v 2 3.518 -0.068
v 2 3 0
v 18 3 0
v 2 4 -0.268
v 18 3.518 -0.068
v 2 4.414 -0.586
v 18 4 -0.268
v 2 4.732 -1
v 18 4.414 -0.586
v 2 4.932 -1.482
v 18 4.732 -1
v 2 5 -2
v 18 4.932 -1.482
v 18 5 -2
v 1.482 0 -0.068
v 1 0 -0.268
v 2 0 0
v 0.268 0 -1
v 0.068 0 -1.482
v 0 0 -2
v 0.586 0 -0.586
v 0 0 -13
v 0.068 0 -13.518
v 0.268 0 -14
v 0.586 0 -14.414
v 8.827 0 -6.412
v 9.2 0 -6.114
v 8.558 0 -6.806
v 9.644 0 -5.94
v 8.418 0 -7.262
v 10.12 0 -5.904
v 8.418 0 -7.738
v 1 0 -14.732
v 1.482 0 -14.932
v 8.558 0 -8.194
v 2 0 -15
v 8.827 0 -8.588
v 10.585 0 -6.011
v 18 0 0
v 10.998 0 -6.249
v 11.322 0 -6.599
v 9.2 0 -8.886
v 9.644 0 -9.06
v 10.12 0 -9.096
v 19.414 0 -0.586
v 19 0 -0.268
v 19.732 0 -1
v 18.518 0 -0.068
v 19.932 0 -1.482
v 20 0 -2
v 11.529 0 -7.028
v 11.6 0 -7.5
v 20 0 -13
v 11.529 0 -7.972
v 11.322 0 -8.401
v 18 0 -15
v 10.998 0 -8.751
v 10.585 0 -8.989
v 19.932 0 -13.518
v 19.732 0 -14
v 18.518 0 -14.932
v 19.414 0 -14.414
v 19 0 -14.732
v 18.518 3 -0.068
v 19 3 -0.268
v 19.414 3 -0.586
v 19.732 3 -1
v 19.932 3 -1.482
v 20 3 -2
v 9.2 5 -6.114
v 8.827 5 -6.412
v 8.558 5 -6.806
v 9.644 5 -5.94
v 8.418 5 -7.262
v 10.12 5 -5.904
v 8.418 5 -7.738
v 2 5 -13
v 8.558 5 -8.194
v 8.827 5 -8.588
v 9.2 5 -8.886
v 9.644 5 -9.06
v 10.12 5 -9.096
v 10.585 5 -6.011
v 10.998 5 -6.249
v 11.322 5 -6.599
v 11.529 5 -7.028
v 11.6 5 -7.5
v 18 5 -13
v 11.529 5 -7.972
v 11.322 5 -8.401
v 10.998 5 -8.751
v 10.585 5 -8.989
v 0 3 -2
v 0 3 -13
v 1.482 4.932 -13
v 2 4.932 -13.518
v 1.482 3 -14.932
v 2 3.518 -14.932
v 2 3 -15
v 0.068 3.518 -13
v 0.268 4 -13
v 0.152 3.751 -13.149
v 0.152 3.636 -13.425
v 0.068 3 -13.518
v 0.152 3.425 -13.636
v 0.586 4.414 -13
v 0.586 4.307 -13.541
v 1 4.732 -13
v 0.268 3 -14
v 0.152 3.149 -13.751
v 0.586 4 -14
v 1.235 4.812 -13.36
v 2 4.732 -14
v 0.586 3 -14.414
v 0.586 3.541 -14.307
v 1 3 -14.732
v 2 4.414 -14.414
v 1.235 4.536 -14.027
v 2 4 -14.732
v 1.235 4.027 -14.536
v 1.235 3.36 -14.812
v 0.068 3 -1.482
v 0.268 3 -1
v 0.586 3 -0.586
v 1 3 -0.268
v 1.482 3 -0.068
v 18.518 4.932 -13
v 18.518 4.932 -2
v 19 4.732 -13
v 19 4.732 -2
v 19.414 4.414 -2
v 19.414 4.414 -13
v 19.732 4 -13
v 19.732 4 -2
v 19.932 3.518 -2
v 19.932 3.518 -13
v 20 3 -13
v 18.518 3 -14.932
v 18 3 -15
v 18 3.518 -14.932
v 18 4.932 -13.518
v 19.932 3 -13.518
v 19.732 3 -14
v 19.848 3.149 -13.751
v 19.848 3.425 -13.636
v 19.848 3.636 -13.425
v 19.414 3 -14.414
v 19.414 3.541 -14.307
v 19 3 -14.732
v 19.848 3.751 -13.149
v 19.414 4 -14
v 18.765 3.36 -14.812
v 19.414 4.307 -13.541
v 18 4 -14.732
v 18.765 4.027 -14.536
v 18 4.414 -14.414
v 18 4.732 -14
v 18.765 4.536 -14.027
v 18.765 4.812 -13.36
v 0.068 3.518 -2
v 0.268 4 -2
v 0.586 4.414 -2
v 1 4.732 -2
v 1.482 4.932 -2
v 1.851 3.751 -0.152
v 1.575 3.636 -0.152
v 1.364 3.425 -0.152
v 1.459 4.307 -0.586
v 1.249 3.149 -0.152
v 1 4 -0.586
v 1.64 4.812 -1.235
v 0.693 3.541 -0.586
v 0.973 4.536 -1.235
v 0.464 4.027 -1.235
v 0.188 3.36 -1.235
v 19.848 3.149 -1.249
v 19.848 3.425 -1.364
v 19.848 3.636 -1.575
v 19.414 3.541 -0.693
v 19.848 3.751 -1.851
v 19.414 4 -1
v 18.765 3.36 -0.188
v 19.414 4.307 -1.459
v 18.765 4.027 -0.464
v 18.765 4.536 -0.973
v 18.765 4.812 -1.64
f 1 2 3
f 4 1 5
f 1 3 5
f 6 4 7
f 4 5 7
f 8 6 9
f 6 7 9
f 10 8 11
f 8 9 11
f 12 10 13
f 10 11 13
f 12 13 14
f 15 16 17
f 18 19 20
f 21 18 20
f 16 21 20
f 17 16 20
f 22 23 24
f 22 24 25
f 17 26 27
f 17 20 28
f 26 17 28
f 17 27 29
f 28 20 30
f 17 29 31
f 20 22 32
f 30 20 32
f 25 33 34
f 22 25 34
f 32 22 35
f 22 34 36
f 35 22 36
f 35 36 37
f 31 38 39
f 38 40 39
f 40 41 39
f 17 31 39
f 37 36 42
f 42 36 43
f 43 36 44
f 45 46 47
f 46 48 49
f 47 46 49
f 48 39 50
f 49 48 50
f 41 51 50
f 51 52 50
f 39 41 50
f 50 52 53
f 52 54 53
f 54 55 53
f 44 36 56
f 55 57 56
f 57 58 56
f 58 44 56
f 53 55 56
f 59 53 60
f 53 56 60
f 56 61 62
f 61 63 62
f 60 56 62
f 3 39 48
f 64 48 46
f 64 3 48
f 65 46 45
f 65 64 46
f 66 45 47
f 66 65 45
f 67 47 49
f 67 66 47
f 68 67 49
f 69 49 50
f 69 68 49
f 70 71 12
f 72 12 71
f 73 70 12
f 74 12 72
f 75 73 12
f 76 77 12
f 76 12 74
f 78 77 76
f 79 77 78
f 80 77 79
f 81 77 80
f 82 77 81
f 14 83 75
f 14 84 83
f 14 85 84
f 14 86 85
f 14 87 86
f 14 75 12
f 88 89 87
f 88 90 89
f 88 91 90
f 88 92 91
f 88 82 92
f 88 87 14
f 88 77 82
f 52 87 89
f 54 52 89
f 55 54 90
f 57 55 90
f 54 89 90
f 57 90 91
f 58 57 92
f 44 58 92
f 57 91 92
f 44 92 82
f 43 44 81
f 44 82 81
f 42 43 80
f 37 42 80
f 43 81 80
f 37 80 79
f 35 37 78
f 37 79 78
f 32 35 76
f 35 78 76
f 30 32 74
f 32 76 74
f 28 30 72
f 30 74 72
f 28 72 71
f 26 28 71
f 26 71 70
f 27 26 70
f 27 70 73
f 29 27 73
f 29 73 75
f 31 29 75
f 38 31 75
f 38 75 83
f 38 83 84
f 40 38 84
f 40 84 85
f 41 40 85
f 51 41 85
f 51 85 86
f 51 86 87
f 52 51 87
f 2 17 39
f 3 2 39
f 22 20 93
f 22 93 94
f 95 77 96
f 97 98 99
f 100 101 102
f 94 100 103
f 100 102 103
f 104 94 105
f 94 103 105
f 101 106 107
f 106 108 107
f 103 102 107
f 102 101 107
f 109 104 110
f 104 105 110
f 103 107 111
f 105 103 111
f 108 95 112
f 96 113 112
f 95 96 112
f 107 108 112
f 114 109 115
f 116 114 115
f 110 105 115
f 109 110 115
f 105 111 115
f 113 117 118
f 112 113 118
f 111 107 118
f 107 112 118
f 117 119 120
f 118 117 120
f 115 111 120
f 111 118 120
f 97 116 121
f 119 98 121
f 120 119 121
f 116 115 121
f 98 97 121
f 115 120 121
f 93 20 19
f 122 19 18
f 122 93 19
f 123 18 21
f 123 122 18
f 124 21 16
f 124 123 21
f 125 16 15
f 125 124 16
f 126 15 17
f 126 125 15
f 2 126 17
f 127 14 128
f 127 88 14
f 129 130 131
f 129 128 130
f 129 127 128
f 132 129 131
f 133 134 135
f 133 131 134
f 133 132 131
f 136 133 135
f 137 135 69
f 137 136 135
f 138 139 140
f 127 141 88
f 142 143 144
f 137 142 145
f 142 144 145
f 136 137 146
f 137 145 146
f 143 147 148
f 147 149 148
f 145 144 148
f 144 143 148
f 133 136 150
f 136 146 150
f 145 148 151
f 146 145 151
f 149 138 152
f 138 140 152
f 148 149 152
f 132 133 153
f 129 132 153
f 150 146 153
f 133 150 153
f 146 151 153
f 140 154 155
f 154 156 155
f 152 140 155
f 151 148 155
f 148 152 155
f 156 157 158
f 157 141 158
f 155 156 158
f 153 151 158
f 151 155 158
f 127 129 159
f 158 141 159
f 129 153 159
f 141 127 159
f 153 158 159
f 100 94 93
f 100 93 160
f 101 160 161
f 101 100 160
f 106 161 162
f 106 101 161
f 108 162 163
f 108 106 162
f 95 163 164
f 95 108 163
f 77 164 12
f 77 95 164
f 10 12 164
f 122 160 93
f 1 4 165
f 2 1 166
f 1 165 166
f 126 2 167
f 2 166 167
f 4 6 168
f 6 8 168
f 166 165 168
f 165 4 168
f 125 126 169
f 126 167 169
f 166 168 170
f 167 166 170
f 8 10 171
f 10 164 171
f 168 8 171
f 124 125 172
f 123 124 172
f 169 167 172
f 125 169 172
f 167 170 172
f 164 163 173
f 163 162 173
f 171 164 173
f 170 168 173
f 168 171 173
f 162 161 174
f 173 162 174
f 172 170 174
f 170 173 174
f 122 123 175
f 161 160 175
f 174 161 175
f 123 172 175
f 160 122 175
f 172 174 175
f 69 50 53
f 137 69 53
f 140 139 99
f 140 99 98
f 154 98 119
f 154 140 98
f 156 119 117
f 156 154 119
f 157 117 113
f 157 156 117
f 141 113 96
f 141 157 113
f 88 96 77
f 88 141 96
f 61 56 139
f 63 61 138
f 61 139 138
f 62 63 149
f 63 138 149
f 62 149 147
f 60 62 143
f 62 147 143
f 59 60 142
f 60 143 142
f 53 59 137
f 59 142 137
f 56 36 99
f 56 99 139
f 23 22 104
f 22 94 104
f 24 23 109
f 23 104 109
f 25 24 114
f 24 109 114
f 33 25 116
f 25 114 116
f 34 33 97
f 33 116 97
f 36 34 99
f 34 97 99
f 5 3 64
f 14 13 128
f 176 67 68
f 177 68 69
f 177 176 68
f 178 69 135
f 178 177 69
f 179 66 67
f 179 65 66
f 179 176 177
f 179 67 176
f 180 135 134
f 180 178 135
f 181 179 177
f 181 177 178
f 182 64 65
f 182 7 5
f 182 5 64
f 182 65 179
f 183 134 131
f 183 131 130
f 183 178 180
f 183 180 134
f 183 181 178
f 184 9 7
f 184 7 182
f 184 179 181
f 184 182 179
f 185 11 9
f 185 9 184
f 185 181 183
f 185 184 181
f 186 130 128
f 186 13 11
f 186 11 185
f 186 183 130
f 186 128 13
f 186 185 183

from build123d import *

# Parameters (mm, degrees)
SKETCH2_W           = 20
SKETCH2_H           = 15
BOSS_EXTRUDE1_DEPTH = 5
SKETCH3_R           = 1.6
CUT_EXTRUDE1_DEPTH  = 6
FILLET1_R           = 2


with BuildPart() as part:
    # Sketch2 → Boss-Extrude1 (new body)
    with BuildSketch(Plane(origin=(0, 0, 0), x_dir=(1, 0, 0), z_dir=(0, 1, 0))):
        with Locations((10, 7.5)):
            Rectangle(SKETCH2_W, SKETCH2_H)
    extrude(amount=BOSS_EXTRUDE1_DEPTH)

    # Sketch3 → Cut-Extrude1 (cut, through all)
    with BuildSketch(Plane(origin=(0, 5, 0), x_dir=(1, 0, 0), z_dir=(0, 1, 0))):
        with Locations((10, 7.5)):
            Circle(SKETCH3_R)
    extrude(amount=-CUT_EXTRUDE1_DEPTH, mode=Mode.SUBTRACT)

    # Fillet1
    fillet1_edges = [part.edges().sort_by_distance(p)[0] for p in [
        (10, 5, -15),
        (0, 5, -7.5),
        (10, 5, 0),
        (0, 2.5, 0),
        (0, 2.5, -15),
        (20, 2.5, -15),
        (20, 2.5, 0),
        (20, 5, -7.5),
    ]]
    fillet(fillet1_edges, radius=FILLET1_R)


solid = part.part
